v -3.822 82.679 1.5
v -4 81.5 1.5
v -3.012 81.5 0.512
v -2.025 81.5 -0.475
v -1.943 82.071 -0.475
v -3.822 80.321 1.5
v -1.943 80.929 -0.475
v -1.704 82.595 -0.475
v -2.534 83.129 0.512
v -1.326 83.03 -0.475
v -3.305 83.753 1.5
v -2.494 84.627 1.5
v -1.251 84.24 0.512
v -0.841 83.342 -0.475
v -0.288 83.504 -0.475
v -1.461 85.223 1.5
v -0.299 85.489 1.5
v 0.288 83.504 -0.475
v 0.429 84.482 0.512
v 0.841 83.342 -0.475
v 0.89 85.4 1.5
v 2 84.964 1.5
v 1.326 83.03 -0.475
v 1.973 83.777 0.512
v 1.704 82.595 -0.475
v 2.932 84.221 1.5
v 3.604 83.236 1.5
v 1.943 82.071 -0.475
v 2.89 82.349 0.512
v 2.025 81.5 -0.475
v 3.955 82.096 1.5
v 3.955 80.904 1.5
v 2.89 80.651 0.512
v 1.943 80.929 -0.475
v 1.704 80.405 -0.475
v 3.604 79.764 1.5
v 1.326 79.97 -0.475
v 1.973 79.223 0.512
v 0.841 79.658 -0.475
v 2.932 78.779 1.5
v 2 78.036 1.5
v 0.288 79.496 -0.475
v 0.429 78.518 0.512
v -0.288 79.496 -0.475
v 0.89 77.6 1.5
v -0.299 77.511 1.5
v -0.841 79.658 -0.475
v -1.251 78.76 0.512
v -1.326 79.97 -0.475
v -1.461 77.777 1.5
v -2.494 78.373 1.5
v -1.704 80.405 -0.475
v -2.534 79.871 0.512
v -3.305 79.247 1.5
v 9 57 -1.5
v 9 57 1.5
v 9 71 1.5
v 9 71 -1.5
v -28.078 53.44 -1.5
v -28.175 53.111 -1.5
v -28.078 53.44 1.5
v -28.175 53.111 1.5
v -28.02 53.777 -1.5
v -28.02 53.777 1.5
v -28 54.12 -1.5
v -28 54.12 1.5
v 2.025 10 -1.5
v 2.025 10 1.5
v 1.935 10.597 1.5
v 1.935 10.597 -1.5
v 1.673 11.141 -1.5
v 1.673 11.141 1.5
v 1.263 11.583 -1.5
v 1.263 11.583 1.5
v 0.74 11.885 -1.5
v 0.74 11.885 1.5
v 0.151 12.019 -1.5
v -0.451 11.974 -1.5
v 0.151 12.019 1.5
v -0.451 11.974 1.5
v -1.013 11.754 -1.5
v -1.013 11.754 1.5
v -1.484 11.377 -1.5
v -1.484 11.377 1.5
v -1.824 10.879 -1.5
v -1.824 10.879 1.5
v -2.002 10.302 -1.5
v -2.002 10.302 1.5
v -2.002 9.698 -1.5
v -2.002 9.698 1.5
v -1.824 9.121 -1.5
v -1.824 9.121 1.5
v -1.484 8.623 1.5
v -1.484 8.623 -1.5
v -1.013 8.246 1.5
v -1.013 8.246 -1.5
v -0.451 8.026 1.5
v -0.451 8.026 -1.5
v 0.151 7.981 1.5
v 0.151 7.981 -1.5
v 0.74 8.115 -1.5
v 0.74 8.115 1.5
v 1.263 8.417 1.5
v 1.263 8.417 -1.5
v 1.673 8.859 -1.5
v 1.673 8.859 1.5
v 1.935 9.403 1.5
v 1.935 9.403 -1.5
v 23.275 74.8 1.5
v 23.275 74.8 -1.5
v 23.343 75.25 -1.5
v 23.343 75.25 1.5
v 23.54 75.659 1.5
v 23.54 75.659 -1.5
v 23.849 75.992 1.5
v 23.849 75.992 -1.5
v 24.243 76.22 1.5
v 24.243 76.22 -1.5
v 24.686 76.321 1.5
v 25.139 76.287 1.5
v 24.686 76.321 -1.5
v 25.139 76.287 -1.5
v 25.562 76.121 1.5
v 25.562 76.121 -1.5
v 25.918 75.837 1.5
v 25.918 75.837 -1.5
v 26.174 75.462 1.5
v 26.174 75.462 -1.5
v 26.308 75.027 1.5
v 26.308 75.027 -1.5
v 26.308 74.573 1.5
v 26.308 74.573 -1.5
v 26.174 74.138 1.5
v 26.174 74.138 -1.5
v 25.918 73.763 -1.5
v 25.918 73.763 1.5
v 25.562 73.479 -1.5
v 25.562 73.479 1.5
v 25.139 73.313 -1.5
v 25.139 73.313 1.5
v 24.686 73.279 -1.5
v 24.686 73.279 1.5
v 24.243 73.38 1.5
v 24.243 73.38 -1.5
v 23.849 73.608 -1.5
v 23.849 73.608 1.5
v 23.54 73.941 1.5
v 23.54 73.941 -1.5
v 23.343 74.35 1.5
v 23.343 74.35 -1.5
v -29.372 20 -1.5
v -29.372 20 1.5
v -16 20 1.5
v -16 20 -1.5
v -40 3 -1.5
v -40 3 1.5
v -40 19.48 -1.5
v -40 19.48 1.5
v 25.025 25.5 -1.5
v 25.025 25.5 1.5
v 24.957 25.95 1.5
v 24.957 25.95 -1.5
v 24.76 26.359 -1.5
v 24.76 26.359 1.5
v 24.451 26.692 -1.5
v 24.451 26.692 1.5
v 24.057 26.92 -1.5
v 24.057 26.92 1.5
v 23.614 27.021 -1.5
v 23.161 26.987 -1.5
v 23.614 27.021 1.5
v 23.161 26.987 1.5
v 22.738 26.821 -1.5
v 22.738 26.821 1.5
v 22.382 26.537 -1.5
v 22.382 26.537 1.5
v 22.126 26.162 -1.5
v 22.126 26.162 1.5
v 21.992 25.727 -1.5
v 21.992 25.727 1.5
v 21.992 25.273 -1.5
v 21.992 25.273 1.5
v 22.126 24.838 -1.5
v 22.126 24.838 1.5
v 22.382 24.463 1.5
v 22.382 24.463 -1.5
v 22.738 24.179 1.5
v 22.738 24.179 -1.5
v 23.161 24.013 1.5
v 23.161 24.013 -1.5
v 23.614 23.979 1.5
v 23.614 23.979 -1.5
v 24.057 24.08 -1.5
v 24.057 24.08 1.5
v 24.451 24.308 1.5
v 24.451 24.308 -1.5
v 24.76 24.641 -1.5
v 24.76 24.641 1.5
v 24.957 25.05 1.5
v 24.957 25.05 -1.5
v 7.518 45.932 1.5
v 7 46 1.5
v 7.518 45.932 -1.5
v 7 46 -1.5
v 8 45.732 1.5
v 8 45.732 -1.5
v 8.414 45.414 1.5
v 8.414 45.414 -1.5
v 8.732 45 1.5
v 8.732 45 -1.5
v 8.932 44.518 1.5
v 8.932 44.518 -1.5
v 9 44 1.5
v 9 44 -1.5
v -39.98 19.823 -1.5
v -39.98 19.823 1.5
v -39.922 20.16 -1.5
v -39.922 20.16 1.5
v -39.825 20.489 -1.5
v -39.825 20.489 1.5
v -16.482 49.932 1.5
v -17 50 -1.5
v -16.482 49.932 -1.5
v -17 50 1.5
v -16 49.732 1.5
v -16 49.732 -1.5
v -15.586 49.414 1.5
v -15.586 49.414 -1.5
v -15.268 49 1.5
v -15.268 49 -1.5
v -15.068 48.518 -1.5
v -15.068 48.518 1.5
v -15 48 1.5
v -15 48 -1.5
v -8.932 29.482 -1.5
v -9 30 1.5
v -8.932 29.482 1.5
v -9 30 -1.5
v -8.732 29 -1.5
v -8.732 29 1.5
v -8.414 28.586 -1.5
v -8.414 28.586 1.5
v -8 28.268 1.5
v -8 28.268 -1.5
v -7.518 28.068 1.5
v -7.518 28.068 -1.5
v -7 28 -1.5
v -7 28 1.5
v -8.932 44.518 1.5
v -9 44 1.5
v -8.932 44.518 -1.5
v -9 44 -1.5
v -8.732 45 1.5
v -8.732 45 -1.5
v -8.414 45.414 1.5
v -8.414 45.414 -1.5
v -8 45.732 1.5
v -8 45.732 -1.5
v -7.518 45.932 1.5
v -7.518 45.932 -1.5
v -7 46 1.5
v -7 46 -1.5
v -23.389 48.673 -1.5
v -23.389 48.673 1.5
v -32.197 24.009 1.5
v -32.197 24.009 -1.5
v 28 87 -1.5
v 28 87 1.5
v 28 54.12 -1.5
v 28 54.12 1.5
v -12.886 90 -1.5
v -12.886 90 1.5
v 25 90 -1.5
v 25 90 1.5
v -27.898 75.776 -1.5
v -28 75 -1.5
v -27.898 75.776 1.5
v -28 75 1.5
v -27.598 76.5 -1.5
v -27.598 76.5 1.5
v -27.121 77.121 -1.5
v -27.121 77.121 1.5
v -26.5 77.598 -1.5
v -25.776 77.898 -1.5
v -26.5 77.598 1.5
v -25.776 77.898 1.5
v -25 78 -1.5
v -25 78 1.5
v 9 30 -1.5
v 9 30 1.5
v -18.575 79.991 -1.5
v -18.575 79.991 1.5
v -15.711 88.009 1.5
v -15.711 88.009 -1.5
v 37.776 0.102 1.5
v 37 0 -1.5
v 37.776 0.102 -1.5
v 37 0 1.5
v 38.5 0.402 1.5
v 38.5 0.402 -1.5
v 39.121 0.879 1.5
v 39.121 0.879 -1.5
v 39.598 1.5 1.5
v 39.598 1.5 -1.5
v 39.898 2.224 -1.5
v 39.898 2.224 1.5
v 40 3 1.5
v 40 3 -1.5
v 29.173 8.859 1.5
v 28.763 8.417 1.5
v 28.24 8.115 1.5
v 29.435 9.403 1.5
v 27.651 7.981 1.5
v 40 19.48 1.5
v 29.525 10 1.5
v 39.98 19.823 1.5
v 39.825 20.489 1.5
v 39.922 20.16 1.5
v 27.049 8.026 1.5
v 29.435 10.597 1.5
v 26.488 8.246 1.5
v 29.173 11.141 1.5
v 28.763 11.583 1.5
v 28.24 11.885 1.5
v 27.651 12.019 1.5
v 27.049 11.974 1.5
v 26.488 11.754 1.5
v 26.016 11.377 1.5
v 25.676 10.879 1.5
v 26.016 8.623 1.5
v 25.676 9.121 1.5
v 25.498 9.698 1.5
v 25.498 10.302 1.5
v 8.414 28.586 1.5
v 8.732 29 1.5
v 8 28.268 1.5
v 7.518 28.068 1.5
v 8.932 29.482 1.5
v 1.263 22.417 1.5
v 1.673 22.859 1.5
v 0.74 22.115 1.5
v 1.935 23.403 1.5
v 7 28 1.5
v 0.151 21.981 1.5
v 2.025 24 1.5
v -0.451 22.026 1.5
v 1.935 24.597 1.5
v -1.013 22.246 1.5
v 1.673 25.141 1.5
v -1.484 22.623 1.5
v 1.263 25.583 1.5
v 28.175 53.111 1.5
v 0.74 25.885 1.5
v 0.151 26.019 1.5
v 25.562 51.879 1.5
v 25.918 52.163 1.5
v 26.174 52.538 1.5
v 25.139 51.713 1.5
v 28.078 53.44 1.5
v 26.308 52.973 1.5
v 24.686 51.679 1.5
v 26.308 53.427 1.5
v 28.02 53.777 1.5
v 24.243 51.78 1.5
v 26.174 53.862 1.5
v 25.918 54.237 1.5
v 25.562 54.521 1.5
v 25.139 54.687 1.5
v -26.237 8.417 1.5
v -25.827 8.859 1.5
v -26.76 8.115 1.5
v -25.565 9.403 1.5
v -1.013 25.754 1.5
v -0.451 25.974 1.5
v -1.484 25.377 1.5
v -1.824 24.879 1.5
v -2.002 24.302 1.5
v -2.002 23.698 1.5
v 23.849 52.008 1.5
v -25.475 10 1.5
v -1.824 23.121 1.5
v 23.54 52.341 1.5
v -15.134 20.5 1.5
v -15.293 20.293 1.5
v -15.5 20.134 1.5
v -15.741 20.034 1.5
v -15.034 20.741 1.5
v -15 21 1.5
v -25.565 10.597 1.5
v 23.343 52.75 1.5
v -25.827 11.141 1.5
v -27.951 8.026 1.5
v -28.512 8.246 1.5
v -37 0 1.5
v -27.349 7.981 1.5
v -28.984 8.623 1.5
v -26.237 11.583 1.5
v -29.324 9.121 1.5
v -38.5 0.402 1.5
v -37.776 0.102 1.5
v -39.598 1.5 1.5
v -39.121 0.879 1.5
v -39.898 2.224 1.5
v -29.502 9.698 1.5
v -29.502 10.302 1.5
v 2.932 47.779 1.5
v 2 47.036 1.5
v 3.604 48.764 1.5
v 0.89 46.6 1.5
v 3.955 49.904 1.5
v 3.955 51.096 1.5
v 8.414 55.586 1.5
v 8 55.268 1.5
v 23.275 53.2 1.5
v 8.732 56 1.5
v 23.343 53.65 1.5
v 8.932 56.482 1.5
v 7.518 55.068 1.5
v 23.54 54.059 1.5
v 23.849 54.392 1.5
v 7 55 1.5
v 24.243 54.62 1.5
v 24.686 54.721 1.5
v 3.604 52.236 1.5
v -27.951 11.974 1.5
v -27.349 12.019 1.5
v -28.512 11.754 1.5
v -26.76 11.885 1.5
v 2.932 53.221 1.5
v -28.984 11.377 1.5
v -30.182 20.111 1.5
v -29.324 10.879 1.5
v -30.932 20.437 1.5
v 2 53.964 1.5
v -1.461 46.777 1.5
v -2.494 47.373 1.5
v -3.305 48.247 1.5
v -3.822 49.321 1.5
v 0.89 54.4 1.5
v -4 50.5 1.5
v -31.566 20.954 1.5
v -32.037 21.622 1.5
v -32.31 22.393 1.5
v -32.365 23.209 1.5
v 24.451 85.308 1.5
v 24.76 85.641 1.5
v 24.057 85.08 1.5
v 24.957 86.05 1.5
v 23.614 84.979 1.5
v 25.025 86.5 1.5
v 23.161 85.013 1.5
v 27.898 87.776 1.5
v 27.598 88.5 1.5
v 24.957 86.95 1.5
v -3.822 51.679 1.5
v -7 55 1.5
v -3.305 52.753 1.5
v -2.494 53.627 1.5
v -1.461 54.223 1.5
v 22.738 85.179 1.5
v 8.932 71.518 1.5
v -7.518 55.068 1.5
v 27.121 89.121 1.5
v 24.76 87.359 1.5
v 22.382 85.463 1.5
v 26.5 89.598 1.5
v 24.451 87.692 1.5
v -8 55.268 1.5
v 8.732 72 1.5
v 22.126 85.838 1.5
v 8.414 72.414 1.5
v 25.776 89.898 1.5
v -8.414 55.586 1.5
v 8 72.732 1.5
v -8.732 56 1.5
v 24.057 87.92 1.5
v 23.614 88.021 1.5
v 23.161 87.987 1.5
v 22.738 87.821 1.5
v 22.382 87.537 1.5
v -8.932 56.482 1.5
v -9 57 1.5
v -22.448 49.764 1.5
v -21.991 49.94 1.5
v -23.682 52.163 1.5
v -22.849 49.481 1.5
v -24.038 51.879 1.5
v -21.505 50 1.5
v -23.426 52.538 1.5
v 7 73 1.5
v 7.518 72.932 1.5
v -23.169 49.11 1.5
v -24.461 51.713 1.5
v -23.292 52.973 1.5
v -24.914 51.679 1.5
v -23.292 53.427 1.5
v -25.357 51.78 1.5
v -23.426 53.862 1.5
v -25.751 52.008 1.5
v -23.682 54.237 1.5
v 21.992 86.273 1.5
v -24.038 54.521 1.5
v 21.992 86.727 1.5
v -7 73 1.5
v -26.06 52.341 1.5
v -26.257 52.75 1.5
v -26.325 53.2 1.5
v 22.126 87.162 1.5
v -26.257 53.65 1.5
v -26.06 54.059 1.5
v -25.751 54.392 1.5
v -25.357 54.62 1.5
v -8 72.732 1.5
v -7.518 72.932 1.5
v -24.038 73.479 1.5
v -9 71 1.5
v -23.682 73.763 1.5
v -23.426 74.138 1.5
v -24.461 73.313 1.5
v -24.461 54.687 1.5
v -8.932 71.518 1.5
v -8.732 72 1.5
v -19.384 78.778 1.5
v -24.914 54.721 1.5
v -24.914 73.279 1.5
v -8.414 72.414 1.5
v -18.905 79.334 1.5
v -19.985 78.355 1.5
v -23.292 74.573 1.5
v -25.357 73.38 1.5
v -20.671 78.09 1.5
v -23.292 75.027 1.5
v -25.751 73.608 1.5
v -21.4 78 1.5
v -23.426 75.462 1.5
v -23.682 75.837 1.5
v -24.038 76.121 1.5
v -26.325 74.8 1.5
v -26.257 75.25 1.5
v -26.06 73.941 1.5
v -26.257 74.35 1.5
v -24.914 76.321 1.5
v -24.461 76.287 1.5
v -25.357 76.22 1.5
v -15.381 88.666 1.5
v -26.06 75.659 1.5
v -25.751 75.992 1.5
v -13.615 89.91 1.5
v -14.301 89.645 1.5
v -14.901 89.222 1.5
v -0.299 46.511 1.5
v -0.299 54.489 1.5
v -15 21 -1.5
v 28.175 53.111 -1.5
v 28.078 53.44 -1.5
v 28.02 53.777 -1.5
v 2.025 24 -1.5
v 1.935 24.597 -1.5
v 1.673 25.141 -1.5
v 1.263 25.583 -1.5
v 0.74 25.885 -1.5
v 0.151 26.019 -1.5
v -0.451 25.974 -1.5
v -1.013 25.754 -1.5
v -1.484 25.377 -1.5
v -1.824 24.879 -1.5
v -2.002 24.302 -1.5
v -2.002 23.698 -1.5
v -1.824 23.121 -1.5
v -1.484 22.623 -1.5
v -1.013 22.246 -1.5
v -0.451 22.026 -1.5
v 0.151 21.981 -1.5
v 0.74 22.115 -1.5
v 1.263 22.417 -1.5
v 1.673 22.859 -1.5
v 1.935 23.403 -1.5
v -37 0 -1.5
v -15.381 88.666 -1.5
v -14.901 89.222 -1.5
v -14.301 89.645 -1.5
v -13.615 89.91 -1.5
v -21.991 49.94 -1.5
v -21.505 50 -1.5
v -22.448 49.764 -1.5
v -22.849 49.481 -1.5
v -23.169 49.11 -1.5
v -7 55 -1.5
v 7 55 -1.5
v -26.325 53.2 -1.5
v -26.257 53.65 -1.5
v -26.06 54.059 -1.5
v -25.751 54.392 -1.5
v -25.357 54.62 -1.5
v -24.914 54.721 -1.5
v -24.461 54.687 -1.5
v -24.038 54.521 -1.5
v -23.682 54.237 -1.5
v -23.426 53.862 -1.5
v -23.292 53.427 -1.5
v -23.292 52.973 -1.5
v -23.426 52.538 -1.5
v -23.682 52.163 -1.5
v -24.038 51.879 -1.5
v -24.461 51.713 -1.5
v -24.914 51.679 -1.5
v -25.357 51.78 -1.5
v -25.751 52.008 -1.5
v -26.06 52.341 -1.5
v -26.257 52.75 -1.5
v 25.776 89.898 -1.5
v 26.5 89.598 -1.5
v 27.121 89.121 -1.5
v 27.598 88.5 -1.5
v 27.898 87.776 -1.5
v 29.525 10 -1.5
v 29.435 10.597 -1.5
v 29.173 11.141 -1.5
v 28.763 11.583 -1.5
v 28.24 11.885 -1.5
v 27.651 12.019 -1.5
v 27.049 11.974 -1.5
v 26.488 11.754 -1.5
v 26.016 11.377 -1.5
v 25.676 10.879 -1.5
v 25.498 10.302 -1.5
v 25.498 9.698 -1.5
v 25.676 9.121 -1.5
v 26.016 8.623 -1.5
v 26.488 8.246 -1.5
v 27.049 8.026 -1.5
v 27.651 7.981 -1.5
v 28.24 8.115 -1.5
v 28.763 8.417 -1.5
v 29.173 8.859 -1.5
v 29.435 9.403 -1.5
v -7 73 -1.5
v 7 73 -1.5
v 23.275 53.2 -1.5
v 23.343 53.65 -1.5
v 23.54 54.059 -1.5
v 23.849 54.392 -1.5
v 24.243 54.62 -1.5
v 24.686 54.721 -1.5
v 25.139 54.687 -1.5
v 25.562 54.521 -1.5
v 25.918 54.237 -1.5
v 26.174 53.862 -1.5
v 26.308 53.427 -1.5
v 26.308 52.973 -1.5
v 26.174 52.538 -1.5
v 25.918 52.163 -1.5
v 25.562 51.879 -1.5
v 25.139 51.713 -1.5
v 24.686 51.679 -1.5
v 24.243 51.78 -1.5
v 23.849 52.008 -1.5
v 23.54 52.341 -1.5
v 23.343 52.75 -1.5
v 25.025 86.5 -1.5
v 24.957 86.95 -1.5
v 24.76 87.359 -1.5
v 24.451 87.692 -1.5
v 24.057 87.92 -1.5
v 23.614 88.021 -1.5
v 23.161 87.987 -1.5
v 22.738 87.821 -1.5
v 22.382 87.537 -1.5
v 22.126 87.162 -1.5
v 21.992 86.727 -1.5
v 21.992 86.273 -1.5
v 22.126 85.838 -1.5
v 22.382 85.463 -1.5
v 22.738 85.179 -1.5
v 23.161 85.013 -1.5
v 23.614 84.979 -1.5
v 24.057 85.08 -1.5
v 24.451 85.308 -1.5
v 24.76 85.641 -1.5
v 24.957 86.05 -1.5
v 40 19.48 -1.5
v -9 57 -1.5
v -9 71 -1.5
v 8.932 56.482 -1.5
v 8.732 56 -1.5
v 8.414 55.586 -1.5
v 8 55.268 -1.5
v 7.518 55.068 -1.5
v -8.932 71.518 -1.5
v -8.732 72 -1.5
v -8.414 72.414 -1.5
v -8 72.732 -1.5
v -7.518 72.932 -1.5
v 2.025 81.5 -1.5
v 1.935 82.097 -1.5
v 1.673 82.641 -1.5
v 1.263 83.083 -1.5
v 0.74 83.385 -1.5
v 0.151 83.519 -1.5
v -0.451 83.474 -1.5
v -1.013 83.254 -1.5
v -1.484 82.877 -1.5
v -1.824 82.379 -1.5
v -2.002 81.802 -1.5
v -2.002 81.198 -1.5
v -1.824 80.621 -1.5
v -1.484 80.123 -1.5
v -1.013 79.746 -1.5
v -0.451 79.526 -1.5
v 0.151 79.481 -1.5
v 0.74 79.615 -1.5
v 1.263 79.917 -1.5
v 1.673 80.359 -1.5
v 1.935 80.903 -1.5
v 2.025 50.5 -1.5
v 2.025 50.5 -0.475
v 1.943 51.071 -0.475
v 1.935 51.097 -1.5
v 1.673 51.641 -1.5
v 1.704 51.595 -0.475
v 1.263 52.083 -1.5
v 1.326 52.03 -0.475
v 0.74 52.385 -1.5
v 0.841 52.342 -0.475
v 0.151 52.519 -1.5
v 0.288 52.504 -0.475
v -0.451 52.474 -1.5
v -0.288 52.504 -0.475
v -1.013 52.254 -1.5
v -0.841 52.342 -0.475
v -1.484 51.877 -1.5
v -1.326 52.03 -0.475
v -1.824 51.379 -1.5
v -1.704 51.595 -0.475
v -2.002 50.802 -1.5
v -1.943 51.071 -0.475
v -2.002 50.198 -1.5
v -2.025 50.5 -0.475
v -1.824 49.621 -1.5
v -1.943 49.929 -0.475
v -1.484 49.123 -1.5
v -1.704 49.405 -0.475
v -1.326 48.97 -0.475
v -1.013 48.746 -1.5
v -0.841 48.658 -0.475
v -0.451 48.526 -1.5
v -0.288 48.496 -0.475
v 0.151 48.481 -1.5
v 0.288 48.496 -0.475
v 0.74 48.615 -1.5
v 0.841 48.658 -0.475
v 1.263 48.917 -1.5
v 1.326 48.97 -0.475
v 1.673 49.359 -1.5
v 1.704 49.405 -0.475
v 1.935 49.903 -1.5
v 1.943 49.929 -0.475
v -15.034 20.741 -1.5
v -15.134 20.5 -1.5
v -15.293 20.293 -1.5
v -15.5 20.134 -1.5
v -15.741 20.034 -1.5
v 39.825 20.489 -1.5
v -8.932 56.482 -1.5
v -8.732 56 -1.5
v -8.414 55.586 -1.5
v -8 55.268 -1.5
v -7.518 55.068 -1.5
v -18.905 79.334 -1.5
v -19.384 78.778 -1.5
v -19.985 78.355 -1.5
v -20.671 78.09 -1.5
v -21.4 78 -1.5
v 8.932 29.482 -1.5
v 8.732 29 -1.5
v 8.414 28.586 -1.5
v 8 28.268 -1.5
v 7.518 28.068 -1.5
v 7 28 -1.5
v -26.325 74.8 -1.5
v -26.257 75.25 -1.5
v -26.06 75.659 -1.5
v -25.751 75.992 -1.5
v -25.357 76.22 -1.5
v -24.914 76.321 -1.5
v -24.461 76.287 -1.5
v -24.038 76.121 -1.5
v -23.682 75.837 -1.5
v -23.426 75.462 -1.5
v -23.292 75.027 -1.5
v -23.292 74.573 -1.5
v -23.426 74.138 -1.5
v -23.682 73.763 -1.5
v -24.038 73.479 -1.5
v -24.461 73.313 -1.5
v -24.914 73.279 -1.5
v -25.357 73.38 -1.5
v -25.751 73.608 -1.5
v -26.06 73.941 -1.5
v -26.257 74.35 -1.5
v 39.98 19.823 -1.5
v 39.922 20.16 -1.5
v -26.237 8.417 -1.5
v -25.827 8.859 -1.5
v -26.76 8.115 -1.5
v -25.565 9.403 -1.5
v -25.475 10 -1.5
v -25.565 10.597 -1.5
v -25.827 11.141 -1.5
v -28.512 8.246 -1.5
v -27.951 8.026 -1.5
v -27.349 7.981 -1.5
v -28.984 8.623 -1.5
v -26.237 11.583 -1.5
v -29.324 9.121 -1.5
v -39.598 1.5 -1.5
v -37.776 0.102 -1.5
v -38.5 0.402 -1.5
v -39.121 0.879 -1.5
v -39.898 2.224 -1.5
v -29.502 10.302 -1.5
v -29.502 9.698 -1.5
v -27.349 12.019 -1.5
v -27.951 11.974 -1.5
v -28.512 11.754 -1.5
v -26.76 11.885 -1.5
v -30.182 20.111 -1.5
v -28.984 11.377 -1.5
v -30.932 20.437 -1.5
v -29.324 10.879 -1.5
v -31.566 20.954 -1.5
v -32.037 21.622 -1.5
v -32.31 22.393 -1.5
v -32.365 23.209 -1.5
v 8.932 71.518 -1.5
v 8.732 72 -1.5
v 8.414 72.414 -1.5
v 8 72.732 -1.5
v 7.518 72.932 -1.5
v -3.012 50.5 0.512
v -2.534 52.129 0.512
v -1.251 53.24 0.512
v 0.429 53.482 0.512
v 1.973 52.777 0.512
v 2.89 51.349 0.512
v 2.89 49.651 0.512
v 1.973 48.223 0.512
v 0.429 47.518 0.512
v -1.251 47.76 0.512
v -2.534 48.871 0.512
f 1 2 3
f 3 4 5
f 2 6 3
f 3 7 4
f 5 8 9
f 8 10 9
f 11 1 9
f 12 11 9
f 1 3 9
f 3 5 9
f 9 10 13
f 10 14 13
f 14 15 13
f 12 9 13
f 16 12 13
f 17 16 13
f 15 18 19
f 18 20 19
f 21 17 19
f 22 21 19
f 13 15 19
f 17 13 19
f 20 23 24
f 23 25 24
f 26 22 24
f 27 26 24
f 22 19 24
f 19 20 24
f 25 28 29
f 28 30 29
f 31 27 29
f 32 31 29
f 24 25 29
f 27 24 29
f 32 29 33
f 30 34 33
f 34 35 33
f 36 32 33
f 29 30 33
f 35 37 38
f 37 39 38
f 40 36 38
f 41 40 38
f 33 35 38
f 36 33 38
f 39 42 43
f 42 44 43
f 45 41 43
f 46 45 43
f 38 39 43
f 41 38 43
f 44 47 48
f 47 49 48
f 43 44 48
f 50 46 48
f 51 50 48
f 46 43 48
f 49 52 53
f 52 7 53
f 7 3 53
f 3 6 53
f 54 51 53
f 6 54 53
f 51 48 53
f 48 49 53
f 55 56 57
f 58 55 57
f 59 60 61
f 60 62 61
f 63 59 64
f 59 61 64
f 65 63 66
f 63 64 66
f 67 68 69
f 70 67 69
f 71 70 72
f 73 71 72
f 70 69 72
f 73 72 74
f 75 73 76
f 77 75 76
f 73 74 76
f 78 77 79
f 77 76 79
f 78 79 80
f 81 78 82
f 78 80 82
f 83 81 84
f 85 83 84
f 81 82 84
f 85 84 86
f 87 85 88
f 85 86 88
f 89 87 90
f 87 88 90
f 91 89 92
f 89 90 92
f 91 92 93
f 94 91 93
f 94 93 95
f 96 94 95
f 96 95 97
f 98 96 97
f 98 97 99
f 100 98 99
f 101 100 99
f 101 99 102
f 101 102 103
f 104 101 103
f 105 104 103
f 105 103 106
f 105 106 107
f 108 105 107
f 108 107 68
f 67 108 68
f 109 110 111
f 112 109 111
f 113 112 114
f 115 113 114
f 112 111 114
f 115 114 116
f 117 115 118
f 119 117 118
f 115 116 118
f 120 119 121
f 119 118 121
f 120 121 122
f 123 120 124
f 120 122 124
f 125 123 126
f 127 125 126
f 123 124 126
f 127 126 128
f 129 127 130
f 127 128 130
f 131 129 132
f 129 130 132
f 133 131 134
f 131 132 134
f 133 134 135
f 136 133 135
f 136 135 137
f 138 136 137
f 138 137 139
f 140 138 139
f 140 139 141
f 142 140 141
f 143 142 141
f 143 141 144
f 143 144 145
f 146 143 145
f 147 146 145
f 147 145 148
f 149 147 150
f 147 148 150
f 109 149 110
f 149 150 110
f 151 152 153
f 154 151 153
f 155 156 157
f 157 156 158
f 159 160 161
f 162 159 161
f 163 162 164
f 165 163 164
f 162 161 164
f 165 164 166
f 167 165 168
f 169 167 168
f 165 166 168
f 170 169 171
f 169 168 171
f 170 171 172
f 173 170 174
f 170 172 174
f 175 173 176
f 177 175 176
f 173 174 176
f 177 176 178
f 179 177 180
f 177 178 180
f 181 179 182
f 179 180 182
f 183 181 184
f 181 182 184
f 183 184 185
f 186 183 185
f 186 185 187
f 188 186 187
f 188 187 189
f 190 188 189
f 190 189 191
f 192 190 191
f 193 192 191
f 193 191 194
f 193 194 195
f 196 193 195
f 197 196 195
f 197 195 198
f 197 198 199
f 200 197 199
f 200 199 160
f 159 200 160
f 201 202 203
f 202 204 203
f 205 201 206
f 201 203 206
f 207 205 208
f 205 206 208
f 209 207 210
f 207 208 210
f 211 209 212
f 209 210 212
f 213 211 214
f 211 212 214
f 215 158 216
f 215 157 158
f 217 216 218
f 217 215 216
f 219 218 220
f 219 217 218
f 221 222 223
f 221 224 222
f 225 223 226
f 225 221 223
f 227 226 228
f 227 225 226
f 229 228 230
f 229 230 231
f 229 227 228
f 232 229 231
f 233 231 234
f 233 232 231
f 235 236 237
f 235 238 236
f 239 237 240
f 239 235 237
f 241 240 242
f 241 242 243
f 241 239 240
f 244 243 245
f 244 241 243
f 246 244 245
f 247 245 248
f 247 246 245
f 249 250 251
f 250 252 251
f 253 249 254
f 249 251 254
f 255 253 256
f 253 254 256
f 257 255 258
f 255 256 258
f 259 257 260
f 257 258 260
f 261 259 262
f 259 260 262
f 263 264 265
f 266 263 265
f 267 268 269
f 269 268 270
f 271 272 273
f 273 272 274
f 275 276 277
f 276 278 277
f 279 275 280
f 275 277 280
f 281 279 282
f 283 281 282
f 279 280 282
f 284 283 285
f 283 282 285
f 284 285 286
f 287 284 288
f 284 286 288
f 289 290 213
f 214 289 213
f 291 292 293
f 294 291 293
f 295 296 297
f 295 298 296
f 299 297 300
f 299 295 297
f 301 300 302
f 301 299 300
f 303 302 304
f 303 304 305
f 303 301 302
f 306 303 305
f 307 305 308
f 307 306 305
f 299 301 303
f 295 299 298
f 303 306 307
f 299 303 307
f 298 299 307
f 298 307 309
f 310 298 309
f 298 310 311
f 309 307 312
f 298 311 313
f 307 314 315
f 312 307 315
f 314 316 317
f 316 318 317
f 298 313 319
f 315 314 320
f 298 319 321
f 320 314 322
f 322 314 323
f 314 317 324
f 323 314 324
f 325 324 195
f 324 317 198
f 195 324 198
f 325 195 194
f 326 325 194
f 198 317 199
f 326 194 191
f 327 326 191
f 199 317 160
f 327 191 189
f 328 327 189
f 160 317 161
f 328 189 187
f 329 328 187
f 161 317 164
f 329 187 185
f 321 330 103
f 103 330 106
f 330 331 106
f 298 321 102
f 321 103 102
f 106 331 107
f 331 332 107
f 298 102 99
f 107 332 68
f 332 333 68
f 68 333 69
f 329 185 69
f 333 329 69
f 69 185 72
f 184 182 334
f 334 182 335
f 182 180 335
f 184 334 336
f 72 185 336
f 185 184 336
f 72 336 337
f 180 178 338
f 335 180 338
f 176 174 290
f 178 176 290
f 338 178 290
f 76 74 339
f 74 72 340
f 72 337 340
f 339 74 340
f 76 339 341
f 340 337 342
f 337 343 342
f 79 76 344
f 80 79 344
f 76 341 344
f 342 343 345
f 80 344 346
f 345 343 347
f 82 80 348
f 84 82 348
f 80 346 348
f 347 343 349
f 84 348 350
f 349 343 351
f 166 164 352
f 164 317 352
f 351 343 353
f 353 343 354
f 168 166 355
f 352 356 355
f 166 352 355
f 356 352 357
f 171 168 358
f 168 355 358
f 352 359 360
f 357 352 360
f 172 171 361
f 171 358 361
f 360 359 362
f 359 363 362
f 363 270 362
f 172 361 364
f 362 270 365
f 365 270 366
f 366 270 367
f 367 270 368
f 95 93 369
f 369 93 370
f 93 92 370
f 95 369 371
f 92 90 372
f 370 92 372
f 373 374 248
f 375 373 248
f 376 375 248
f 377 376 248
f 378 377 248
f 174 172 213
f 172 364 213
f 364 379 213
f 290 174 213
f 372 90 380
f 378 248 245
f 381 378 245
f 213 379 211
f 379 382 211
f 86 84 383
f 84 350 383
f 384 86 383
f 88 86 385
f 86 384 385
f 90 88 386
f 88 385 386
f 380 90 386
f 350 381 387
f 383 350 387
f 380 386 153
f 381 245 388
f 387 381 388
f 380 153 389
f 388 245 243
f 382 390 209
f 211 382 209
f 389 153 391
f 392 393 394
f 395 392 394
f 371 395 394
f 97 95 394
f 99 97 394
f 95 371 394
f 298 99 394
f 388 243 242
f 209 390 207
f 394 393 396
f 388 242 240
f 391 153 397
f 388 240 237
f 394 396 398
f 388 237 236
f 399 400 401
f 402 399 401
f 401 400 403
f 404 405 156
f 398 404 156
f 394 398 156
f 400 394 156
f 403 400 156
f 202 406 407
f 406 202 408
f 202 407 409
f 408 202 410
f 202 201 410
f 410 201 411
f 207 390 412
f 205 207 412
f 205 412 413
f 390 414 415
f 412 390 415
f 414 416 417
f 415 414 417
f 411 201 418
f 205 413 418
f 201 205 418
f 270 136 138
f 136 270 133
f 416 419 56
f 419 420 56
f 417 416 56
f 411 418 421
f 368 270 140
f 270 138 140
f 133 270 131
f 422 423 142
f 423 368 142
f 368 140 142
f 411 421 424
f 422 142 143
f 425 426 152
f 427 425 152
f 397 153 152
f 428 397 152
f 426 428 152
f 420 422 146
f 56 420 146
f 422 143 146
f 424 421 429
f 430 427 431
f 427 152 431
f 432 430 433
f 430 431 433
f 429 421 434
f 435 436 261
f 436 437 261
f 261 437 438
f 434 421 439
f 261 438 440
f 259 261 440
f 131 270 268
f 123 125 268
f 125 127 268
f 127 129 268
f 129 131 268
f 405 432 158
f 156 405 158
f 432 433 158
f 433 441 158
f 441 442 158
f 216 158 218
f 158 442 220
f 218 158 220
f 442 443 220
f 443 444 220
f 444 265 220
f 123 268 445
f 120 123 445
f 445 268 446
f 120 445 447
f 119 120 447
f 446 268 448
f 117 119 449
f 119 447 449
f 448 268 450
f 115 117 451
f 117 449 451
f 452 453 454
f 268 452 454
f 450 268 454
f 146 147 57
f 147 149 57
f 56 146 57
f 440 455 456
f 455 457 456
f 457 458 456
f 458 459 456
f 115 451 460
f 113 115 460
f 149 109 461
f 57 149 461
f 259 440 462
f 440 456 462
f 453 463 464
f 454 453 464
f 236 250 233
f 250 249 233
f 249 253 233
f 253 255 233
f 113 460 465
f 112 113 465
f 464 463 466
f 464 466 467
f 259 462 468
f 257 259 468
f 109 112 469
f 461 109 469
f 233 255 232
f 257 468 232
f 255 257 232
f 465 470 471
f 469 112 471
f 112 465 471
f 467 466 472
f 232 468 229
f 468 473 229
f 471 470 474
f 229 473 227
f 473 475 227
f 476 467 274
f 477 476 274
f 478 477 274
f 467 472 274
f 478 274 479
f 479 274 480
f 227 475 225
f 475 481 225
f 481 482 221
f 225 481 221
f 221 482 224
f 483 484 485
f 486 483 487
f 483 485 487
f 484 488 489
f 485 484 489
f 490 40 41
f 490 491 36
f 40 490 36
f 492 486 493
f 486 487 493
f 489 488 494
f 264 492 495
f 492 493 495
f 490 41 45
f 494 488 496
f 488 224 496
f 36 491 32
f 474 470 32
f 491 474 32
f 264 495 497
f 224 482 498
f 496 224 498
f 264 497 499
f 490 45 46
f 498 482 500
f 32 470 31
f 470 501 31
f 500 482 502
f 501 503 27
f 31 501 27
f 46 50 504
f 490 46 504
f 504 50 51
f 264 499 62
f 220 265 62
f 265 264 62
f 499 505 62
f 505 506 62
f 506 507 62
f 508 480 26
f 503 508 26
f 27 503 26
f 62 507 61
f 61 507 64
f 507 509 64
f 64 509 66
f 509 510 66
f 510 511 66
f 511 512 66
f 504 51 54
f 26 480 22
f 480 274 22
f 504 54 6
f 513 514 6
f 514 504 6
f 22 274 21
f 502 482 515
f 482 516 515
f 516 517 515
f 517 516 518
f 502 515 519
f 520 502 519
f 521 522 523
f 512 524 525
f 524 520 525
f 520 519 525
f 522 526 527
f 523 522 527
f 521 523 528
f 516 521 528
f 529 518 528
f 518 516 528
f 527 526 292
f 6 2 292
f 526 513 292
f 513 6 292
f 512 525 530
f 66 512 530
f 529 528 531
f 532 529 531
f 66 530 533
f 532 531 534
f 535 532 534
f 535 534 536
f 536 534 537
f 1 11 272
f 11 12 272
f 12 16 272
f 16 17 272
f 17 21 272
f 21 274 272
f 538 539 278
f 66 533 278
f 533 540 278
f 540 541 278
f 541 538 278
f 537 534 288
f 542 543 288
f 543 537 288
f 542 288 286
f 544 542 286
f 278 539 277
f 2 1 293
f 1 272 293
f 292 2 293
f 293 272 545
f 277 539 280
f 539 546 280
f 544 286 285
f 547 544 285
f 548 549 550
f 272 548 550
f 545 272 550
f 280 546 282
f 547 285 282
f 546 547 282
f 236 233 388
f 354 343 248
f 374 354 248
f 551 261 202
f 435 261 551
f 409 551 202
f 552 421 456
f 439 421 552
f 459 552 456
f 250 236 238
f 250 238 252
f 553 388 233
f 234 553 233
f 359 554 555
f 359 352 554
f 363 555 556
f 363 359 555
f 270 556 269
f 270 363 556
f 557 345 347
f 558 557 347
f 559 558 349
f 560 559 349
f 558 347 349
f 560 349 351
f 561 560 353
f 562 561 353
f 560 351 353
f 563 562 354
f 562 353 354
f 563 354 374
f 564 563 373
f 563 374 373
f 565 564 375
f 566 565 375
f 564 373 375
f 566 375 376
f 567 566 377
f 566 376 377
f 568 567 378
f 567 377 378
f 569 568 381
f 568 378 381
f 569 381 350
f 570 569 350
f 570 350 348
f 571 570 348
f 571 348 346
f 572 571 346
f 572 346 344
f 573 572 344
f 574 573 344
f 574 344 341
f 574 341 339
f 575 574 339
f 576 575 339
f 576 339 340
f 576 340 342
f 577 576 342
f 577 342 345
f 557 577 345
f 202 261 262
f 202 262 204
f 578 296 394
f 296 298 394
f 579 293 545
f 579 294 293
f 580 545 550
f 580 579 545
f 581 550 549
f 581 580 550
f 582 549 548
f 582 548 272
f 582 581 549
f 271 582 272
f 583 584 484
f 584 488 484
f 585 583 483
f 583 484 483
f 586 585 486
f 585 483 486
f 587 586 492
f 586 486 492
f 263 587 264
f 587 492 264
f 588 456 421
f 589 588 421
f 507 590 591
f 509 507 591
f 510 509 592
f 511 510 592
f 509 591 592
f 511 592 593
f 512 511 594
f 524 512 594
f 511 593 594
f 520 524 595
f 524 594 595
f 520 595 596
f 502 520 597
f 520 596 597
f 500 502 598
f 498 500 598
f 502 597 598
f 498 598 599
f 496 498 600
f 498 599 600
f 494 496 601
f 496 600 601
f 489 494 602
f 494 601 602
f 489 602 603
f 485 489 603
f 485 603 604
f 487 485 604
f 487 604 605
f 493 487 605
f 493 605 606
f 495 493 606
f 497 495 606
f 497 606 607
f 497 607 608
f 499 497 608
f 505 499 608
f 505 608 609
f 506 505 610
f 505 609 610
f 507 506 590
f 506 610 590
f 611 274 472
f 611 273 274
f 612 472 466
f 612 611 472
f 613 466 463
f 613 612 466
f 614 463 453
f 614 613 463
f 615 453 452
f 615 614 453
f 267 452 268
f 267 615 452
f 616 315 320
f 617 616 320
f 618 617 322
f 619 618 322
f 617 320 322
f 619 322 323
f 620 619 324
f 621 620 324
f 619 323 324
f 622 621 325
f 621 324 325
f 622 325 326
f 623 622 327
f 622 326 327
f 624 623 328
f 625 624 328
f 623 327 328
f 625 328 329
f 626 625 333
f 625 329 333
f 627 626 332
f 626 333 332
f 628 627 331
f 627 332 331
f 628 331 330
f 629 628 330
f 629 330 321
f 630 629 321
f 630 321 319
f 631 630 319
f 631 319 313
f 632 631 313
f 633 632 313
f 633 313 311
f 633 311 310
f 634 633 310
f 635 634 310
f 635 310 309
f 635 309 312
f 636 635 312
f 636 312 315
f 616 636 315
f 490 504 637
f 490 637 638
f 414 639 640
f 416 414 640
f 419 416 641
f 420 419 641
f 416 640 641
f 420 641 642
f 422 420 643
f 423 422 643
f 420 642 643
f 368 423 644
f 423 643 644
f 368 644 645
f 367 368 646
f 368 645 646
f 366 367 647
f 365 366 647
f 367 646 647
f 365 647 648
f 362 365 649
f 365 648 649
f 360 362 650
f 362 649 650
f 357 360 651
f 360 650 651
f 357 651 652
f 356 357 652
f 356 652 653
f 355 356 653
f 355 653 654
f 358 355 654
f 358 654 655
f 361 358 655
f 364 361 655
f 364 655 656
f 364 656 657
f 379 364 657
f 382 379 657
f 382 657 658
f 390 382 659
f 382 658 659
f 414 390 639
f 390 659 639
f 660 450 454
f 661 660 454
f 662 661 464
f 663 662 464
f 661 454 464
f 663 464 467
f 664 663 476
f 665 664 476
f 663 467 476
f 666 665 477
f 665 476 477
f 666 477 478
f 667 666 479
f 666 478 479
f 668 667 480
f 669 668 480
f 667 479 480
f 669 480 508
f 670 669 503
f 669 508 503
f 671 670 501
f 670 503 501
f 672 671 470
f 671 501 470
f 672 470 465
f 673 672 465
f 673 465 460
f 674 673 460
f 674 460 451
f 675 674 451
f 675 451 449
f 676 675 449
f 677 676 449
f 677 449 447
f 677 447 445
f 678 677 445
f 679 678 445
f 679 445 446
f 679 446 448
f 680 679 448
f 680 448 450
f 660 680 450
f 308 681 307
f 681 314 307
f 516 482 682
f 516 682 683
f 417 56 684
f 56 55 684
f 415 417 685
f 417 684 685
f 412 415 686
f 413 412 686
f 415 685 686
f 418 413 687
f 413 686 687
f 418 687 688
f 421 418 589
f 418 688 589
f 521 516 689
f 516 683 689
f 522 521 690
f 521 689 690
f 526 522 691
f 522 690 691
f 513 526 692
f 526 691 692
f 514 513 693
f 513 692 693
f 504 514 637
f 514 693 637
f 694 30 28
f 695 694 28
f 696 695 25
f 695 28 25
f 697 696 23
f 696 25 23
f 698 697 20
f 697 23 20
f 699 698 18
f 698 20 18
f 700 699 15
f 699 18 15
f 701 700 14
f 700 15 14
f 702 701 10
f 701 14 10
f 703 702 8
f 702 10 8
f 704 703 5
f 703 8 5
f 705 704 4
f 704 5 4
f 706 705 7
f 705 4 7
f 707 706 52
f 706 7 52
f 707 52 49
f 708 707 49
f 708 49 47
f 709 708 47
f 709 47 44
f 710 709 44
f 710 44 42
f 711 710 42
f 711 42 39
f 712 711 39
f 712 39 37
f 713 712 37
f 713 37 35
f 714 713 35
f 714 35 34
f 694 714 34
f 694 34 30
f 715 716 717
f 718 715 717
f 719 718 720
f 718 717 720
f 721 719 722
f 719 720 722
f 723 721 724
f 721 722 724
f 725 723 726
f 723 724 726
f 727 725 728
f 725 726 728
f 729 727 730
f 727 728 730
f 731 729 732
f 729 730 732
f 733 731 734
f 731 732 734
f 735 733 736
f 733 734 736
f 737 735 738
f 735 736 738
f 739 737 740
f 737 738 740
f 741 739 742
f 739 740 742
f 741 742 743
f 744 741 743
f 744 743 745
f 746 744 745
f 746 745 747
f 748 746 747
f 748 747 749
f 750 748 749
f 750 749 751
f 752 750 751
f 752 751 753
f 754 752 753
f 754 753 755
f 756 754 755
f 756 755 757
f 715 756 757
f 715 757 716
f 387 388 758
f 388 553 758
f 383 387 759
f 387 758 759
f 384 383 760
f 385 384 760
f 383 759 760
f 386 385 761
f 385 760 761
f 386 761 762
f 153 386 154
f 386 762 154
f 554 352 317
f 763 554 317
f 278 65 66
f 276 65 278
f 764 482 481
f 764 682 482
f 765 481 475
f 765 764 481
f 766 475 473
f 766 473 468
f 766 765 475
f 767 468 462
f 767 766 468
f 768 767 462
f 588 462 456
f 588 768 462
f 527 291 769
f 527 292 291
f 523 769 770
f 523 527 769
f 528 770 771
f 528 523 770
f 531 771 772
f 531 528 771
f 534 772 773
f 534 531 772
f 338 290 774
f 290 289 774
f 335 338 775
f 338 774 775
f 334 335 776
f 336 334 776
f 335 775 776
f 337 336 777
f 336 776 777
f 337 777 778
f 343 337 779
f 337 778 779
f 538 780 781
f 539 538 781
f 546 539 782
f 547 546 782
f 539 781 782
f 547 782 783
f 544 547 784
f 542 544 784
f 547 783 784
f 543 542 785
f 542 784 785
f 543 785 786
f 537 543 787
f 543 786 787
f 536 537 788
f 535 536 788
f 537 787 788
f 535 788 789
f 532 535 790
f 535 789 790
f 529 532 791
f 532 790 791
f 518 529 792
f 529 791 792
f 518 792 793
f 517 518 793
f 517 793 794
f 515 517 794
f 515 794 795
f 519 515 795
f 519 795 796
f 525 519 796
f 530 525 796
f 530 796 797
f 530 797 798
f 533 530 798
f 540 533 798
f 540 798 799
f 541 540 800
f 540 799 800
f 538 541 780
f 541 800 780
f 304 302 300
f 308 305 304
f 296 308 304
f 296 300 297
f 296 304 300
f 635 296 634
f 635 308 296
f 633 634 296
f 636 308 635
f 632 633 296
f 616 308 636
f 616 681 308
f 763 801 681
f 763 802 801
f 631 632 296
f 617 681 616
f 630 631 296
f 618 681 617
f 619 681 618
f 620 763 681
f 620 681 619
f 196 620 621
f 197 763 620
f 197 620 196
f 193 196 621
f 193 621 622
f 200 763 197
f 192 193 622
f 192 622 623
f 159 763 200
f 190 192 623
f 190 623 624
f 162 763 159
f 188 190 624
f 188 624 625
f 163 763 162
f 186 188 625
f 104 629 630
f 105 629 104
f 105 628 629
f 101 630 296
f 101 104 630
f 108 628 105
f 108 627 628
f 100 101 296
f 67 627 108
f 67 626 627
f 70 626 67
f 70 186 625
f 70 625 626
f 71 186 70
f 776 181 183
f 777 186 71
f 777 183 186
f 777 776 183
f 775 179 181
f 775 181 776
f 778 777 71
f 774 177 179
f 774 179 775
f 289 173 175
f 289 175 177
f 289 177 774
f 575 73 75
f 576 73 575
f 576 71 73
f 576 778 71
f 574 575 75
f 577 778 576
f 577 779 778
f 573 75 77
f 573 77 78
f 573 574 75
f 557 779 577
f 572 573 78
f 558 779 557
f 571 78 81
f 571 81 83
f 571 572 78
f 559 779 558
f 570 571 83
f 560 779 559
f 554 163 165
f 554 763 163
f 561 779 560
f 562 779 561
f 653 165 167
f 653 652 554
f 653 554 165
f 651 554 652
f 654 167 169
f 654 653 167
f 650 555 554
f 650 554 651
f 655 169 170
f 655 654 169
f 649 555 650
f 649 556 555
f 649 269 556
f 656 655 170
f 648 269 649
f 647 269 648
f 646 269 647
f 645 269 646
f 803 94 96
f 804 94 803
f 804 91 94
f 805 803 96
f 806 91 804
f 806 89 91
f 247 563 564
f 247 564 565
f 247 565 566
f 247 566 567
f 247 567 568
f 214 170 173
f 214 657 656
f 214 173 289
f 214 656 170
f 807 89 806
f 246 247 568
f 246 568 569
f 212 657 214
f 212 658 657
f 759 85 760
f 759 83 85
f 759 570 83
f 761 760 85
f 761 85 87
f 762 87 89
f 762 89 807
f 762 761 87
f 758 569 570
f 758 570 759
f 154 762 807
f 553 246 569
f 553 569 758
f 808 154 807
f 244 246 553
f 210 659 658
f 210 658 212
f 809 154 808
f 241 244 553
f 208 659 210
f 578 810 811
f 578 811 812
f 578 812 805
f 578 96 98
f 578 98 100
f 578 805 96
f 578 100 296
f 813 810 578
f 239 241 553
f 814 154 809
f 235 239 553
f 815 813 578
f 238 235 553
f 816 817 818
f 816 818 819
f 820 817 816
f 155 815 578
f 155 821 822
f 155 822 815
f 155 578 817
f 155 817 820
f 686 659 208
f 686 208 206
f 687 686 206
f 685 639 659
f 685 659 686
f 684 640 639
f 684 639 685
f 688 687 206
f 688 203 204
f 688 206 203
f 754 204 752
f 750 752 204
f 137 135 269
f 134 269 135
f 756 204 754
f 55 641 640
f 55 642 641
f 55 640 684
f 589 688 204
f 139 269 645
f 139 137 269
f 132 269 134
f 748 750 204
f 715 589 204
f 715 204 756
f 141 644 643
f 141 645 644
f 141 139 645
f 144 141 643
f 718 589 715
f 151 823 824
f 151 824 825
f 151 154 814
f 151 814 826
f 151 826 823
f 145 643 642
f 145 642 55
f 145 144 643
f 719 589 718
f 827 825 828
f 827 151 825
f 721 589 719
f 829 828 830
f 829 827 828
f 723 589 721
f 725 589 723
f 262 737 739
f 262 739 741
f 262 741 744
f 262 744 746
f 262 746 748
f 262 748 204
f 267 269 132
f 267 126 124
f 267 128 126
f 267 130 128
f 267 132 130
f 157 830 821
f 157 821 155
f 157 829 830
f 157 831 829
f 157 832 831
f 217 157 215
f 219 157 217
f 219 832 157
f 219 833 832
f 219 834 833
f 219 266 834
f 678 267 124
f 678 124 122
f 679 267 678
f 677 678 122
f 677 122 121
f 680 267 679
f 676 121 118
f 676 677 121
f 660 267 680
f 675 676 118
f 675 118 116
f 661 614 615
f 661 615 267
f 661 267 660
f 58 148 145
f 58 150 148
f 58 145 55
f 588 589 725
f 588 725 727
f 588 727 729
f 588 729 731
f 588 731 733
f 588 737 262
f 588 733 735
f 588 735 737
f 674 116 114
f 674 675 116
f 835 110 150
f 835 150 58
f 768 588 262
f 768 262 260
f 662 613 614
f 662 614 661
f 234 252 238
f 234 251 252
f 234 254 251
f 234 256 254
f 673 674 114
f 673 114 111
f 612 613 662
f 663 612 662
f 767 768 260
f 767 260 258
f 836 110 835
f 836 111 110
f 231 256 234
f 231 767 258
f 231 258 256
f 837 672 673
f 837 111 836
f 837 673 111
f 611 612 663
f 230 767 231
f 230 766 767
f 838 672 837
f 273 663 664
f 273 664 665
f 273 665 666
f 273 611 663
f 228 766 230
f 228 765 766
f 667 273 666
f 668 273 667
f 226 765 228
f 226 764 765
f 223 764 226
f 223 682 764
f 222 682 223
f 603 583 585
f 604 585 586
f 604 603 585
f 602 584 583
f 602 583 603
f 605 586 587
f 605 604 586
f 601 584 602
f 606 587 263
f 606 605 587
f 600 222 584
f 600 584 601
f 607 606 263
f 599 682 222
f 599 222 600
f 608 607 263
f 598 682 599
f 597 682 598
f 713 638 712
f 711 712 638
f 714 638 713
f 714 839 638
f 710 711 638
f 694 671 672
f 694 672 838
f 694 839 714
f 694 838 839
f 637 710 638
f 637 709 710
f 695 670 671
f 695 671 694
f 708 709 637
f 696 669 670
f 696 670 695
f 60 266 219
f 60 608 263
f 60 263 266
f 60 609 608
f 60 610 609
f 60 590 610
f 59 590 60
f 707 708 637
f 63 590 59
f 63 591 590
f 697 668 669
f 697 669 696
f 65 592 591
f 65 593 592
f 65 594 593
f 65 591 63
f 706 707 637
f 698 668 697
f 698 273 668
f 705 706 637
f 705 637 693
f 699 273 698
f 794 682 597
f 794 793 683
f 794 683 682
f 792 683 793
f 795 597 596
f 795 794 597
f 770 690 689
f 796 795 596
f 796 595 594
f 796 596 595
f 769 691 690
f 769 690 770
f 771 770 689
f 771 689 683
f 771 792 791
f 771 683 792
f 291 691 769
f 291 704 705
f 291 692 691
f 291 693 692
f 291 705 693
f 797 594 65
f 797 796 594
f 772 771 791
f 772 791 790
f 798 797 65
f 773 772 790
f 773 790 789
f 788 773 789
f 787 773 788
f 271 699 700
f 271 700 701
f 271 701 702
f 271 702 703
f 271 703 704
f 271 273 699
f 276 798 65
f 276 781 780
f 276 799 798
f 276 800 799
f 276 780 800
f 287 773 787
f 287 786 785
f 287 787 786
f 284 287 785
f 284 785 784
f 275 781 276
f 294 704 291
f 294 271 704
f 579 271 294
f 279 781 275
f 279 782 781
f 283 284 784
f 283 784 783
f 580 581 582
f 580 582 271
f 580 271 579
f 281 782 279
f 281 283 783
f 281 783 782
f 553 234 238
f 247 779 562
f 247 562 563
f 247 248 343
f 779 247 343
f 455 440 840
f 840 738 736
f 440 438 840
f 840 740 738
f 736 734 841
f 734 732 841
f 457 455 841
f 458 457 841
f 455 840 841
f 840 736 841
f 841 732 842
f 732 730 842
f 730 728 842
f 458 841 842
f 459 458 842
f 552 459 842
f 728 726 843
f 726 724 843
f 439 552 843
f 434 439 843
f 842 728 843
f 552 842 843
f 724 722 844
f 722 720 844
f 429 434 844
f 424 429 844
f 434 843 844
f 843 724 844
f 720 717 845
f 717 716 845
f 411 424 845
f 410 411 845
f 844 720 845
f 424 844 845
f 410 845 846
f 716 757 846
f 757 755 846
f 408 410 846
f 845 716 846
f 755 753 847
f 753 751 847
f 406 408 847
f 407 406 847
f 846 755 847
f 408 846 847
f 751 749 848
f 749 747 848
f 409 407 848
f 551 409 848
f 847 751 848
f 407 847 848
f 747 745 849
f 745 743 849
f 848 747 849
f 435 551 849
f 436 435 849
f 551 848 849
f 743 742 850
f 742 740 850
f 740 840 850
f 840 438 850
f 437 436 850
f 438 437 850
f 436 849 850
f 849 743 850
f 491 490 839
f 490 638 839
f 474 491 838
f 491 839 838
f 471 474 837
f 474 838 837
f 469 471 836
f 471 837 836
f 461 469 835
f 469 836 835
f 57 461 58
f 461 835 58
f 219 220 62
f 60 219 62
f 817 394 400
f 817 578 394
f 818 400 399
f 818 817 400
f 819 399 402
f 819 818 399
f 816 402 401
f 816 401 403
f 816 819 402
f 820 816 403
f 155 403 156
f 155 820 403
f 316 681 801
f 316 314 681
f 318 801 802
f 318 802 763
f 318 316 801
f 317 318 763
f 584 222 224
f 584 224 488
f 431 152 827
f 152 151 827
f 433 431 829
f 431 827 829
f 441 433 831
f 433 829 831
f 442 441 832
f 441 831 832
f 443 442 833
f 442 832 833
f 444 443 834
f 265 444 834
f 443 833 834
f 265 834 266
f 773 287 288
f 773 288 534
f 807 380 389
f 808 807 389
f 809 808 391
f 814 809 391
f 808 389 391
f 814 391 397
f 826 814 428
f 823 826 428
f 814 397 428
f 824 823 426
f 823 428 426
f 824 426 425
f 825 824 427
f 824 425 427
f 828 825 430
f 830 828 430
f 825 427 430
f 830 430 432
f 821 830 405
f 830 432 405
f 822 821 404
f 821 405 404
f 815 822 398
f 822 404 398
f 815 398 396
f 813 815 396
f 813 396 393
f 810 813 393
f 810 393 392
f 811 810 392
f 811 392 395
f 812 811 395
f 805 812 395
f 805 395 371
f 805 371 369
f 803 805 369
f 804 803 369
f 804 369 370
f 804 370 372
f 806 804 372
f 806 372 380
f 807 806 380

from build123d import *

# Parameters (mm, degrees)
EXTRUDE_1_DEPTH           = 1.5
SKETCH_2_W                = 18
SKETCH_2_H                = 18
CUT_EXTRUDE_1_DEPTH       = 3
FILLET_1_R                = 1
FILLET_2_R                = 2
FILLET_3_R                = 3
SKETCH_3_R                = 2.025
CUT_EXTRUDE_2_DEPTH       = 1
CUT_EXTRUDE_2_DEPTH_BACK  = 4
SKETCH_4_R                = 2.025
CUT_EXTRUDE_3_DEPTH       = 1
CUT_EXTRUDE_3_DEPTH_BACK  = 4
SKETCH_5_R                = 2.025
CUT_EXTRUDE_4_DEPTH       = 1
CUT_EXTRUDE_4_DEPTH_BACK  = 4
FILLET_4_R                = 3
EXTRUDE_2_DEPTH           = 3
FILLET_5_R                = 3
SKETCH_7_R                = 1.525
CUT_EXTRUDE_5_DEPTH       = 3
HOLE_WIZARD_1_D           = 4.05
HOLE_WIZARD_1_DEPTH       = 100
HOLE_WIZARD_1_CSINK_D     = 8
HOLE_WIZARD_1_CSINK_ANGLE = 90
EXTRUDE_3_DEPTH           = 3
FILLET_6_R                = 3
SKETCH_12_R               = 1.525
CUT_EXTRUDE_6_DEPTH       = 1
CUT_EXTRUDE_6_DEPTH_BACK  = 4
FILLET_7_R                = 2


with BuildPart() as part:
    # 草图1 → 凸台-拉伸1 (new body, symmetric)
    with BuildSketch(Plane.XY):
        Polygon((40, 0), (-40, 0), (-40, 20), (-15, 90), (15, 90), (40, 20), align=None)
    extrude(amount=EXTRUDE_1_DEPTH, both=True)

    # 草图2 → 切除-拉伸1 (cut)
    with BuildSketch(Plane.XY.offset(1.5)):
        Polygon((-15, 72.160717503), (-33.62882768, 20), (-15, 20), align=None)
        with Locations((0, 64)):
            Rectangle(SKETCH_2_W, SKETCH_2_H)
        with Locations((0, 37)):
            Rectangle(SKETCH_2_W, SKETCH_2_H)
    extrude(amount=-CUT_EXTRUDE_1_DEPTH, mode=Mode.SUBTRACT)

    # 圆角1
    fillet_1_edges = [part.edges().sort_by_distance(p)[0] for p in [
        (-15, 20, 0),
        (-15, 72.160717503, 0),
    ]]
    fillet(fillet_1_edges, radius=FILLET_1_R)

    # 圆角2
    fillet_2_edges = [part.edges().sort_by_distance(p)[0] for p in [
        (-9, 46, 0),
        (-9, 28, 0),
        (9, 28, 0),
        (9, 46, 0),
        (-9, 73, 0),
        (-9, 55, 0),
        (9, 55, 0),
        (9, 73, 0),
    ]]
    fillet(fillet_2_edges, radius=FILLET_2_R)

    # 圆角3
    fillet_3_edges = [part.edges().sort_by_distance(p)[0] for p in [
        (40, 0, 0),
        (-40, 0, 0),
        (-40, 20, 0),
        (-15, 90, 0),
        (15, 90, 0),
        (40, 20, 0),
    ]]
    fillet(fillet_3_edges, radius=FILLET_3_R)

    # 草图3 → 切除-拉伸2 (cut, two sides)
    with BuildSketch(Plane.XY.offset(1.5)) as cut_extrude_2_sk:
        with Locations((-27.5, 10)):
            Circle(SKETCH_3_R)
        with Locations((27.5, 10)):
            Circle(SKETCH_3_R)
    extrude(amount=CUT_EXTRUDE_2_DEPTH, mode=Mode.SUBTRACT)
    extrude(cut_extrude_2_sk.sketch, amount=-CUT_EXTRUDE_2_DEPTH_BACK, mode=Mode.SUBTRACT)

    # 草图4 → 切除-拉伸3 (cut, two sides)
    with BuildSketch(Plane.XY.offset(1.5)) as cut_extrude_3_sk:
        with Locations((0, 10)):
            Circle(SKETCH_4_R)
    extrude(amount=CUT_EXTRUDE_3_DEPTH, mode=Mode.SUBTRACT)
    extrude(cut_extrude_3_sk.sketch, amount=-CUT_EXTRUDE_3_DEPTH_BACK, mode=Mode.SUBTRACT)

    # 草图5 → 切除-拉伸4 (cut, two sides)
    with BuildSketch(Plane.XY.offset(1.5)) as cut_extrude_4_sk:
        with Locations((0, 24)):
            Circle(SKETCH_5_R)
        with Locations((0, 50.5)):
            Circle(SKETCH_5_R)
        with Locations((0, 81.5)):
            Circle(SKETCH_5_R)
    extrude(amount=CUT_EXTRUDE_4_DEPTH, mode=Mode.SUBTRACT)
    extrude(cut_extrude_4_sk.sketch, amount=-CUT_EXTRUDE_4_DEPTH_BACK, mode=Mode.SUBTRACT)

    # 圆角4
    fillet_4_edges = [part.edges().sort_by_distance(p)[0] for p in [
        (-33.62882768, 20, 0),
    ]]
    fillet(fillet_4_edges, radius=FILLET_4_R)

    # 草图6 → 凸台-拉伸2 (add)
    with BuildSketch(Plane(origin=(0, 0, -1.5), x_dir=(-1, 0, 0), z_dir=(0, 0, -1))):
        with BuildLine():
            Line((15, 66.387503754), (15, 50))
            Line((15, 50), (22.914541965, 50))
            Line((22.914541965, 50), (16.941741912, 66.723840151))
            ThreePointArc((16.941741912, 66.723840151), (15.82932767, 67.372831596), (15, 66.387503754))
        make_face()
        Polygon((-28, 78), (-28, 53.6), (-19.285714286, 78), align=None)
        Polygon((28, 78), (19.285714286, 78), (28, 53.6), align=None)
    extrude(amount=-EXTRUDE_2_DEPTH)

    # 圆角5
    fillet_5_edges = [part.edges().sort_by_distance(p)[0] for p in [
        (28, 53.6, 0),
        (-28, 78, 0),
        (19.285714286, 78, 0),
        (28, 78, 0),
        (-19.285714286, 78, 0),
        (-28, 53.6, 0),
    ]]
    fillet(fillet_5_edges, radius=FILLET_5_R)

    # 草图7 → 切除-拉伸5 (cut)
    with BuildSketch(Plane(origin=(0, 0, -1.5), x_dir=(-1, 0, 0), z_dir=(0, 0, -1))):
        with Locations((24.8, 74.8)):
            Circle(SKETCH_7_R)
        with Locations((24.8, 53.2)):
            Circle(SKETCH_7_R)
        with Locations((-24.8, 53.2)):
            Circle(SKETCH_7_R)
        with Locations((-24.8, 74.8)):
            Circle(SKETCH_7_R)
    extrude(amount=-CUT_EXTRUDE_5_DEPTH, mode=Mode.SUBTRACT)

    # 孔1
    with Locations(Plane.XY.offset(1.5)):
        with Locations((0, 81.5), (0, 50.5)):
            CounterSinkHole(HOLE_WIZARD_1_D / 2, HOLE_WIZARD_1_CSINK_D / 2, depth=HOLE_WIZARD_1_DEPTH, counter_sink_angle=HOLE_WIZARD_1_CSINK_ANGLE)

    # 草图11 → 凸台-拉伸3 (add)
    with BuildSketch(Plane.XY.offset(1.5)):
        with BuildLine():
            Line((12.885842411, 90), (28, 90))
            Line((28, 90), (28, 75))
            ThreePointArc((28, 75), (27.121320344, 77.121320344), (25, 78))
            Line((25, 78), (21.399871874, 78))
            ThreePointArc((21.399871874, 78), (19.671726564, 78.547753319), (18.57464614, 79.990990809))
            Line((18.57464614, 79.990990809), (15.711068146, 88.009009191))
            ThreePointArc((15.711068146, 88.009009191), (14.613987722, 89.452246681), (12.885842411, 90))
        make_face()
    extrude(amount=-EXTRUDE_3_DEPTH)

    # 圆角6
    fillet_6_edges = [part.edges().sort_by_distance(p)[0] for p in [
        (28, 90, 0),
    ]]
    fillet(fillet_6_edges, radius=FILLET_6_R)

    # 草图12 → 切除-拉伸6 (cut, two sides)
    with BuildSketch(Plane.XY.offset(1.5)) as cut_extrude_6_sk:
        with Locations((23.5, 86.5)):
            Circle(SKETCH_12_R)
        with Locations((23.5, 25.5)):
            Circle(SKETCH_12_R)
    extrude(amount=CUT_EXTRUDE_6_DEPTH, mode=Mode.SUBTRACT)
    extrude(cut_extrude_6_sk.sketch, amount=-CUT_EXTRUDE_6_DEPTH_BACK, mode=Mode.SUBTRACT)

    # 圆角7
    fillet_7_edges = [part.edges().sort_by_distance(p)[0] for p in [
        (-22.914541965, 50, 0),
        (-15, 50, 0),
    ]]
    fillet(fillet_7_edges, radius=FILLET_7_R)


solid = part.part
